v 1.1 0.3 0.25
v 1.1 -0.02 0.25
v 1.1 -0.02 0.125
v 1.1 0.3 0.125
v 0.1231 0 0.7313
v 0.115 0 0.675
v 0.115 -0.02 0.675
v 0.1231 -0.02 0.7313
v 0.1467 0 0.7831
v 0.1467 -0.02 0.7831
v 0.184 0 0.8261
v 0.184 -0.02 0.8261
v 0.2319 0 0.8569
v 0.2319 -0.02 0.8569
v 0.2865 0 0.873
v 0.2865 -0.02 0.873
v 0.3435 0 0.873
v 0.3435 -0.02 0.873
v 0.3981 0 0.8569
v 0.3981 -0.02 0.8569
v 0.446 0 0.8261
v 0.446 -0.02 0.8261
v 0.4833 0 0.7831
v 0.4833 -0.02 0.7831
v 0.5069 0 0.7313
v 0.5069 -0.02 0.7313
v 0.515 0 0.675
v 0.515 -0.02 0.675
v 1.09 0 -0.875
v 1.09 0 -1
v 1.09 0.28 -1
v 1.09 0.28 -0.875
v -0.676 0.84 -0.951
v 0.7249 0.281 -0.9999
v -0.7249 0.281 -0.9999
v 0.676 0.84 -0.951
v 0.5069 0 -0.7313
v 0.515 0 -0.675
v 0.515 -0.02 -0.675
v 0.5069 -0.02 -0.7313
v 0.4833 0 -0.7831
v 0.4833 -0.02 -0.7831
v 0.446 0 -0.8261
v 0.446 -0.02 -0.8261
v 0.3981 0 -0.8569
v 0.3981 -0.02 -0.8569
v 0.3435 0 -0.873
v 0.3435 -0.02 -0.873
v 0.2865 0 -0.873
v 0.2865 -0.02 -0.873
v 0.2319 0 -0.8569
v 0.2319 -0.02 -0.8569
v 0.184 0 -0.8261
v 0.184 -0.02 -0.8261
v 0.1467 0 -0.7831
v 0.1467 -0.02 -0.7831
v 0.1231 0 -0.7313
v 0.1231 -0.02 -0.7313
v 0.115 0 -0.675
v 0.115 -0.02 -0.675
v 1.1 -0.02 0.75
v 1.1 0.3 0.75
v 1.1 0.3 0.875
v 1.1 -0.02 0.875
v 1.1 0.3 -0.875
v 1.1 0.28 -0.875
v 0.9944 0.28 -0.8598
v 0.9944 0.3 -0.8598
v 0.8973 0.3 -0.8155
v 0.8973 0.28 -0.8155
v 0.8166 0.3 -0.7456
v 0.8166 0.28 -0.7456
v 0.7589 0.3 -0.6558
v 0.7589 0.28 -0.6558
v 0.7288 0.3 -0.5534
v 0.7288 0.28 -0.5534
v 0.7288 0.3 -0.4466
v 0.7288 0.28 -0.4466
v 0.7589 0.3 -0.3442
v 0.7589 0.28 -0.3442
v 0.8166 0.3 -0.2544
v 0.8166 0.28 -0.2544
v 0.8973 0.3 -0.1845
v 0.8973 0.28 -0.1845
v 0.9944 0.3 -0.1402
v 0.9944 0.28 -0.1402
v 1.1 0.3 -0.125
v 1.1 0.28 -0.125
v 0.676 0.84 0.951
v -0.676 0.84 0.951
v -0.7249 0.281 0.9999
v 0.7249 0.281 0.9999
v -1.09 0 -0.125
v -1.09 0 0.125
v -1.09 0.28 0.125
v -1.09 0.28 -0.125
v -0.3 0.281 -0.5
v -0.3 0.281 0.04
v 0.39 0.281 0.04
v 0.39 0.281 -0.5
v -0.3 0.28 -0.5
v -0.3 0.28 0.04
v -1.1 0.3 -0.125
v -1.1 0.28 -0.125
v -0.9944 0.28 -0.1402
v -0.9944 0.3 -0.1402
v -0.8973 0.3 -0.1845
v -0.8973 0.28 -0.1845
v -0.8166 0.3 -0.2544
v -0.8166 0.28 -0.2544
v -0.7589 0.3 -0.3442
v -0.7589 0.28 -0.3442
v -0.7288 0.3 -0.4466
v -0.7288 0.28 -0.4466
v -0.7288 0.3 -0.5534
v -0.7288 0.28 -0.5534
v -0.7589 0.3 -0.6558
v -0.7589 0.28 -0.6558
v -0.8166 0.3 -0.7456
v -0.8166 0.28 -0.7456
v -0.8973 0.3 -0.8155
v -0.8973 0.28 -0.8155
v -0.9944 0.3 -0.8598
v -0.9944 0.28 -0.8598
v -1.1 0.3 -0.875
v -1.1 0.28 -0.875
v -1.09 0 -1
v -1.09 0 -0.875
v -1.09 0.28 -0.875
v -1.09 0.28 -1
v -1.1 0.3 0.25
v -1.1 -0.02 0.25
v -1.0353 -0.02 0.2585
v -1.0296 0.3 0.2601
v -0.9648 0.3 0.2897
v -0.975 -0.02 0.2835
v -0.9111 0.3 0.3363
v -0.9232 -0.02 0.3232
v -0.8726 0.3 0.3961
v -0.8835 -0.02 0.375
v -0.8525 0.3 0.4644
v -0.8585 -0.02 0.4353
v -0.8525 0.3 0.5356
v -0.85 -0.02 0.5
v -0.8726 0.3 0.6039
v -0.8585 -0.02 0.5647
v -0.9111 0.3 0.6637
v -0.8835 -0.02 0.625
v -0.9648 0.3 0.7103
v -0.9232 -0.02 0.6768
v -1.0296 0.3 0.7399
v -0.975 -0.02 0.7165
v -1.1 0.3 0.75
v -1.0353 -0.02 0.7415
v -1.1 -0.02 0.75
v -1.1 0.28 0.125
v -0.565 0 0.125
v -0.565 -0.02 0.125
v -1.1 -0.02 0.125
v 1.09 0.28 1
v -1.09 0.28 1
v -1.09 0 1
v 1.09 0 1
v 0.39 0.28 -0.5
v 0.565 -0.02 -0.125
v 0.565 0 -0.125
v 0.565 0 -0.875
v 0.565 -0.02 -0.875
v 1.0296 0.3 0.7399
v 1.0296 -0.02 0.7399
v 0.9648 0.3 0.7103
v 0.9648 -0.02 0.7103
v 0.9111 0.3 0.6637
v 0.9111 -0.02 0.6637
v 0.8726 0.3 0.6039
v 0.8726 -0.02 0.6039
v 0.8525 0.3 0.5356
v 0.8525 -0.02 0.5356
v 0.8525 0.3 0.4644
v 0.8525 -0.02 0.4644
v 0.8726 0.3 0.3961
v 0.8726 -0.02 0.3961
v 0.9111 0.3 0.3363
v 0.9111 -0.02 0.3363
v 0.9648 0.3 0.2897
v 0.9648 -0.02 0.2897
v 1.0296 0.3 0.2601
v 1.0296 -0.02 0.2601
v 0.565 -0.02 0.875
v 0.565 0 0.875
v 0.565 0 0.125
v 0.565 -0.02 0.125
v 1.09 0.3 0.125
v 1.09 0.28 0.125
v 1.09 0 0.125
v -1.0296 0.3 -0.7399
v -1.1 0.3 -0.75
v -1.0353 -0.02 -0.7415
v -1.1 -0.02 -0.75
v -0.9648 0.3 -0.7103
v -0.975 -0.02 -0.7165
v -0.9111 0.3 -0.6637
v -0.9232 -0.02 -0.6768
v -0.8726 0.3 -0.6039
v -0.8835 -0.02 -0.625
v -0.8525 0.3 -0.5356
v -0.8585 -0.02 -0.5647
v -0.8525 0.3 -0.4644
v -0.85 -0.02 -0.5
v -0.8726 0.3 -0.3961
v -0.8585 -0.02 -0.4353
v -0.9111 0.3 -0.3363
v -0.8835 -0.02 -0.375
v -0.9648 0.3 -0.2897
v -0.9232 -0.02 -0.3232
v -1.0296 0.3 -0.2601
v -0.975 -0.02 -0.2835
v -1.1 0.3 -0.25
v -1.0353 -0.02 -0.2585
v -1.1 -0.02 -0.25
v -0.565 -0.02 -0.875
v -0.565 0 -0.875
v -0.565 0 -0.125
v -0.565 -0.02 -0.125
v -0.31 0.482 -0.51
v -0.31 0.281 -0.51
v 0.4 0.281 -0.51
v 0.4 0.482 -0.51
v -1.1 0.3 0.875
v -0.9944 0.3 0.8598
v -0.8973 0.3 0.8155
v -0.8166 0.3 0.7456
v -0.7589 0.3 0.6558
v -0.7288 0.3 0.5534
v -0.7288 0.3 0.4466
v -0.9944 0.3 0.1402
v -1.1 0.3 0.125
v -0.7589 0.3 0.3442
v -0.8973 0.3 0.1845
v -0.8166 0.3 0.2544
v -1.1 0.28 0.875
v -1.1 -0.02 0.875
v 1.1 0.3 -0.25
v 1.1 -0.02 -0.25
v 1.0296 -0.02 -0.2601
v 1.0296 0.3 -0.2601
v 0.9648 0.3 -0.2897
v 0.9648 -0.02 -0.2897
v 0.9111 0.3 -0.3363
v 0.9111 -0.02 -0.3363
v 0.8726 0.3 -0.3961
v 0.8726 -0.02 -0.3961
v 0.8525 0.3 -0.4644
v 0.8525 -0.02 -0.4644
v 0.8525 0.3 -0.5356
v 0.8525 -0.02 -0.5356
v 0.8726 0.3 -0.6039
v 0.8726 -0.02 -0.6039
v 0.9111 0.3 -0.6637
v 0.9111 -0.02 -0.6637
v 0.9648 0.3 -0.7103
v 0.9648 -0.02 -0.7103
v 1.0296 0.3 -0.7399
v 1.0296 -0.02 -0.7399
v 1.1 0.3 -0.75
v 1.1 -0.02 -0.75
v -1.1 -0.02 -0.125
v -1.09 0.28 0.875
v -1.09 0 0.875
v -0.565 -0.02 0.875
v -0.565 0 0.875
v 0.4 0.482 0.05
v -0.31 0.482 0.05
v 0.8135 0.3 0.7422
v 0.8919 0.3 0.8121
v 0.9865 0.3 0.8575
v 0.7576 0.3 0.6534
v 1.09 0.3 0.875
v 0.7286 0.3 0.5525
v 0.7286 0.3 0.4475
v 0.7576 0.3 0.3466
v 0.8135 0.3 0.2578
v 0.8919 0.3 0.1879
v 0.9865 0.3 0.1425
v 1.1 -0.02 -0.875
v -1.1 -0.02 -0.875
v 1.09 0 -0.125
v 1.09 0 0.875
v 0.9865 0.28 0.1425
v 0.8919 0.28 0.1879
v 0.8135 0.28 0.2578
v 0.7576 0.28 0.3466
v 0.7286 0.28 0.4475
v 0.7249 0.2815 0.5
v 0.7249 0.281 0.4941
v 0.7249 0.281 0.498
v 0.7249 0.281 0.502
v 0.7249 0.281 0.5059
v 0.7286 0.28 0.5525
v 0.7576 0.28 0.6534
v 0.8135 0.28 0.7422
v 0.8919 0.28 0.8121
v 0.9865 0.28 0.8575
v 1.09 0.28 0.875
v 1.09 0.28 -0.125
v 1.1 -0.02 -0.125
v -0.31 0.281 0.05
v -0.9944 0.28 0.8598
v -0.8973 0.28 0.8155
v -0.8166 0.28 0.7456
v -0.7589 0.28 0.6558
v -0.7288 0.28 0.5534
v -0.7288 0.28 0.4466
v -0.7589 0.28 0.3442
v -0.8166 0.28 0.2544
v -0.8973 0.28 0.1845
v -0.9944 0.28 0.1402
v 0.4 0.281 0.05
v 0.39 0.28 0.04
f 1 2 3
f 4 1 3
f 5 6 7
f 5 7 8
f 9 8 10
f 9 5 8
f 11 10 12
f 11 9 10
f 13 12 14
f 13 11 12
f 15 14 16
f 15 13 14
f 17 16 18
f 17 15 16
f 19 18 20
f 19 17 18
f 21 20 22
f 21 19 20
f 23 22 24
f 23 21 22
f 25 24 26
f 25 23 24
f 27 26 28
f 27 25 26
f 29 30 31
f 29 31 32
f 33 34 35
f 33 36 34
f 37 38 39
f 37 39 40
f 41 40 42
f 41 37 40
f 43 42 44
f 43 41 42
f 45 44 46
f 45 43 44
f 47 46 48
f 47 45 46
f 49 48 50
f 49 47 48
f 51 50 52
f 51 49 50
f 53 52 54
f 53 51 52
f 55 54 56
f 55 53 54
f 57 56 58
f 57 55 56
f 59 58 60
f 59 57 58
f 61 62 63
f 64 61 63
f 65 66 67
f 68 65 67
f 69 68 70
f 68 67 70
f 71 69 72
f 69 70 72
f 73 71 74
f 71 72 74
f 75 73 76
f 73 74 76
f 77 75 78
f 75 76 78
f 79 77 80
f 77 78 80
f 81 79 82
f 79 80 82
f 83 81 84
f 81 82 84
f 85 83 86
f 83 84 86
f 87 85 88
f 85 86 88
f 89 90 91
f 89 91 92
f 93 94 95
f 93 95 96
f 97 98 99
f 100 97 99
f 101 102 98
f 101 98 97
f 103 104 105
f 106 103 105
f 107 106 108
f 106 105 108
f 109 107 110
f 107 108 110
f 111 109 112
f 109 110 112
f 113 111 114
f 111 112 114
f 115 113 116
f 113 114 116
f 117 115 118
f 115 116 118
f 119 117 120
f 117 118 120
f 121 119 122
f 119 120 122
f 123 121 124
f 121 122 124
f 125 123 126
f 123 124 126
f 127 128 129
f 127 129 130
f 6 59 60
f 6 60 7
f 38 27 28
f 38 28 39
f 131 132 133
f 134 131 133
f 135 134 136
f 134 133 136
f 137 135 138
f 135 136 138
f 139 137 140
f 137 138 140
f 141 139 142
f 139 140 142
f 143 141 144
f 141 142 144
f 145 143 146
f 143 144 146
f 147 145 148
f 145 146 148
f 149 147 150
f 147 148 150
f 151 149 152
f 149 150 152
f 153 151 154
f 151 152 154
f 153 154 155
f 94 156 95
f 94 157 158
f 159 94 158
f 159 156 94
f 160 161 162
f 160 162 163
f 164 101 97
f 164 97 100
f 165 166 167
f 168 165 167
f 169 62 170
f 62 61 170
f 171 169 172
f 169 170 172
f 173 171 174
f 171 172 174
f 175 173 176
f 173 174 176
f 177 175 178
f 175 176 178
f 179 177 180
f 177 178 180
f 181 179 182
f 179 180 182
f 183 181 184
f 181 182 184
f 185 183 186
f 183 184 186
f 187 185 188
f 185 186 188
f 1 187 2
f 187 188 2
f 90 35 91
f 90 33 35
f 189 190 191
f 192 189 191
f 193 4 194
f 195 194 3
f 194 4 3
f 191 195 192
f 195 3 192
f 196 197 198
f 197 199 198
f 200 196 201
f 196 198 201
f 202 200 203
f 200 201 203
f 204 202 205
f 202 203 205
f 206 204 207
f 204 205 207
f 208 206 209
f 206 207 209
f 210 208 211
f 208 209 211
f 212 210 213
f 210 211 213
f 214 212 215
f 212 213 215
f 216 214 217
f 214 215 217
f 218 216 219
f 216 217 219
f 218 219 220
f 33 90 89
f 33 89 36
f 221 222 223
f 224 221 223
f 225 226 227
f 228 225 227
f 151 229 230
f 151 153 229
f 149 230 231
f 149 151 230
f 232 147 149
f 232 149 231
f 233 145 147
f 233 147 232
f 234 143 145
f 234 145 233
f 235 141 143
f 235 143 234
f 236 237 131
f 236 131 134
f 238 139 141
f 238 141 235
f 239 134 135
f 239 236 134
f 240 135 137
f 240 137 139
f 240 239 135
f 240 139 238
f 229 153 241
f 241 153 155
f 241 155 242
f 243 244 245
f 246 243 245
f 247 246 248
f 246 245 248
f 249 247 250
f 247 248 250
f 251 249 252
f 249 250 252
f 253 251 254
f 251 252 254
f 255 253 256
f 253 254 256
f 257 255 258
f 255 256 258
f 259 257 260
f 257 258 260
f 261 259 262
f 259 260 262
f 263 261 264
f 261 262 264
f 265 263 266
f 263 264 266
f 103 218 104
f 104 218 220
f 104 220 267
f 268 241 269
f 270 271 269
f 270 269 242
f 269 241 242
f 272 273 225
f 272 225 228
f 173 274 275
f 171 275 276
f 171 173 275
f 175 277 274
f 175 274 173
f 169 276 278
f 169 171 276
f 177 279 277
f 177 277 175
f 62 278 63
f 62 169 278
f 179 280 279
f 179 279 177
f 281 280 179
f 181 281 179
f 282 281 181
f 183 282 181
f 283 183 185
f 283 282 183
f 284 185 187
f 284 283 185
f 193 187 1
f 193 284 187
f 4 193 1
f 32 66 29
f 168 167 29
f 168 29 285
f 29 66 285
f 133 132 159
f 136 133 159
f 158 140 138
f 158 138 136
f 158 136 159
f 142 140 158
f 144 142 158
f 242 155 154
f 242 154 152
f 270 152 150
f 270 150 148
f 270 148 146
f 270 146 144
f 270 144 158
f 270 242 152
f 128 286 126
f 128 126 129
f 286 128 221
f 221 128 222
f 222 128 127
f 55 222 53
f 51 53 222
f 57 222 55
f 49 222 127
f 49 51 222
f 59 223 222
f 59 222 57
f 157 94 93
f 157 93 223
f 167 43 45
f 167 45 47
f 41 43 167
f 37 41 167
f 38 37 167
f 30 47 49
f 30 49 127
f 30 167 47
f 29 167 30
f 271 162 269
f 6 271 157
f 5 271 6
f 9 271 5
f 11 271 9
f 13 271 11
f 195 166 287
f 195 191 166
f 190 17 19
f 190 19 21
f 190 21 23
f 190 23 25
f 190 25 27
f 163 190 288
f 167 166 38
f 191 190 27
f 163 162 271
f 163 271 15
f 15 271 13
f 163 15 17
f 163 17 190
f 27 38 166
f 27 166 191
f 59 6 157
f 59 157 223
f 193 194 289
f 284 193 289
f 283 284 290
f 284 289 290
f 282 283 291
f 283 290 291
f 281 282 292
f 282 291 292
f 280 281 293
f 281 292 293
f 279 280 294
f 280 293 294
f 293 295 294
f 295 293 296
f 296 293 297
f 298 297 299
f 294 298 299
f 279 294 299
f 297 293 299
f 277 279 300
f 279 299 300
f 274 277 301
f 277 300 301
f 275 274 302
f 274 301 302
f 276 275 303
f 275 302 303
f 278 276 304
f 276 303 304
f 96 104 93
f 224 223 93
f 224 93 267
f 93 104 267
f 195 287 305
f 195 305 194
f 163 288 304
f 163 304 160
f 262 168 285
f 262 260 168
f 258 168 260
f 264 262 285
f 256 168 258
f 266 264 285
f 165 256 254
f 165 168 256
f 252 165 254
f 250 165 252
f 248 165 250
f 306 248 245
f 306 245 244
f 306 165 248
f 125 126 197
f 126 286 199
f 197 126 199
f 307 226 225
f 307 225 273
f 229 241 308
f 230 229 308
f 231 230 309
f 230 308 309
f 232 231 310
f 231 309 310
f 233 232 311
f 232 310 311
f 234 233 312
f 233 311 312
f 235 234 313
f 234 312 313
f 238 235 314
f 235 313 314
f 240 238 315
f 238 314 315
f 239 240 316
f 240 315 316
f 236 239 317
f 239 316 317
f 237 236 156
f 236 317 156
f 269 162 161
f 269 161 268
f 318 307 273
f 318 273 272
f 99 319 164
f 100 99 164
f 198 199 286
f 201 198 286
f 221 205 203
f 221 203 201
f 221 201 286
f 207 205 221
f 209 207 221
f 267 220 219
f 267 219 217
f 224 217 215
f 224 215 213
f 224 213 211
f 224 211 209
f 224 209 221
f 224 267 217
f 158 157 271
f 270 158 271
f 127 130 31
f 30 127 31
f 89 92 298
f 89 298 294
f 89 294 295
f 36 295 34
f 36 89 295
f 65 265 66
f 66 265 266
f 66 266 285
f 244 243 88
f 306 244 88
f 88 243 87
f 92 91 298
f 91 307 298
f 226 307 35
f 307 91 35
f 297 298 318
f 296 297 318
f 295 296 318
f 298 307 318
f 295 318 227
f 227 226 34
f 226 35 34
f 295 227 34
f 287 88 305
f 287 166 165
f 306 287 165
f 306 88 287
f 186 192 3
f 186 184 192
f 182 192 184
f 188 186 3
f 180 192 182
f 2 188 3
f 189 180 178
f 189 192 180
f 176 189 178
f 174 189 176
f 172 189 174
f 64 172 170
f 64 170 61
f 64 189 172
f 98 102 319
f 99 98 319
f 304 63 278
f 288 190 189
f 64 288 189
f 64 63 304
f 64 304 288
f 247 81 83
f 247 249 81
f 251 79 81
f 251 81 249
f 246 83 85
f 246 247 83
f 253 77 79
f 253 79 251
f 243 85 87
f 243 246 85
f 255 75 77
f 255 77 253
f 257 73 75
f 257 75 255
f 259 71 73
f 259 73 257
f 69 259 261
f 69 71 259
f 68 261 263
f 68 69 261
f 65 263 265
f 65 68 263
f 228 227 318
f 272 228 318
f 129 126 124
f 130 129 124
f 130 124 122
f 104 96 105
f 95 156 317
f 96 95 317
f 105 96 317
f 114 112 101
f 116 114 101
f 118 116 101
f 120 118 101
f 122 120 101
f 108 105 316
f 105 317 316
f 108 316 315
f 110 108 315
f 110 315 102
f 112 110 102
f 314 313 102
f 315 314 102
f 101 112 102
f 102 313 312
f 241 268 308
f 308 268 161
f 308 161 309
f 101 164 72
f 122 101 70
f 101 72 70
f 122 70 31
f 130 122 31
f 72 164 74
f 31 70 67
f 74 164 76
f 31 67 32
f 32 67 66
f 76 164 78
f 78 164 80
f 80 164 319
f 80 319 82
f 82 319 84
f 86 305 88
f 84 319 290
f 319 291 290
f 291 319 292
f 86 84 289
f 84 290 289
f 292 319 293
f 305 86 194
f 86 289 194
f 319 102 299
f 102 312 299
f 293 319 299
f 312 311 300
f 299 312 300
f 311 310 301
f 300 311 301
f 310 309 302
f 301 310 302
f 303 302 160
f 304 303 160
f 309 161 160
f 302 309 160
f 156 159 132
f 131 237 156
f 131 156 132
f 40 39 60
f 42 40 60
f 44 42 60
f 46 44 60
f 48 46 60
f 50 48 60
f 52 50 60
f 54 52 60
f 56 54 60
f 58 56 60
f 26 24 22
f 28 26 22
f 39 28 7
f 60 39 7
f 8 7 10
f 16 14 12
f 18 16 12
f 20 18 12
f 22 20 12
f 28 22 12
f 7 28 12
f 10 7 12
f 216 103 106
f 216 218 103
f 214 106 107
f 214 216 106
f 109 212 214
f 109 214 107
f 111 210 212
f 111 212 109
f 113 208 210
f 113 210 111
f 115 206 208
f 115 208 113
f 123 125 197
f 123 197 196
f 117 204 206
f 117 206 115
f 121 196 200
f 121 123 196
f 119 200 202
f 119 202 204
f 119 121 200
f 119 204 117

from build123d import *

# Parameters (mm, degrees)
SKETCH1_W             = 2.2
SKETCH1_H             = 2
BOSS_EXTRUDE1_DEPTH   = 0.28
BOSS_EXTRUDE2_DEPTH   = 0.02
CUT_EXTRUDE1_DEPTH    = 2
SKETCH4_W             = 0.125
SKETCH4_H             = 0.28
SKETCH4_W_2           = 0.25
CUT_EXTRUDE2_DEPTH    = 0.01
SKETCH5_W             = 0.125
SKETCH5_H             = 0.28
SKETCH5_W_2           = 0.25
CUT_EXTRUDE3_DEPTH    = 0.01
SKETCH6_W             = 1.45
SKETCH6_H             = 2
BOSS_EXTRUDE3_DEPTH   = 0.56
BOSS_EXTRUDE3_TAPER   = 5
SKETCH8_W             = 1.45
SKETCH8_H             = 2
CUT_EXTRUDE4_DEPTH    = 0.001
SKETCH10_W            = 0.69
SKETCH10_H            = 0.54
BOSS_EXTRUDE5_DEPTH   = 0.2
SKETCH11_W            = 0.71
SKETCH11_H            = 0.56
SKETCH11_W_2          = 0.69
SKETCH11_H_2          = 0.54
CUT_EXTRUDE5_DEPTH    = 0.201
BOSS_EXTRUDE4_DEPTH   = 0.02
BOSS_EXTRUDE6_DEPTH   = 0.02
BODY_MOVE_COPY1_ANGLE = 90
BODY_MOVE_COPY3_ANGLE = 90


with BuildPart() as part:
    # Sketch1 → Boss-Extrude1 (new body)
    with BuildSketch(Plane(origin=(0, 0, 0), x_dir=(1, 0, 0), z_dir=(0, 1, 0))):
        Rectangle(SKETCH1_W, SKETCH1_H)
    extrude(amount=BOSS_EXTRUDE1_DEPTH)

    # Sketch2 → Boss-Extrude2 (add)
    with BuildSketch(Plane(origin=(0, 0.28, 0), x_dir=(1, 0, 0), z_dir=(0, 1, 0))):
        with BuildLine():
            Line((-0.565, 0.875), (-1.1, 0.875))
            Line((-1.1, 0.875), (-1.1, 0.75))
            ThreePointArc((-1.1, 0.75), (-0.923223305, 0.676776695), (-0.85, 0.5))
            ThreePointArc((-0.85, 0.5), (-0.923223305, 0.323223305), (-1.1, 0.25))
            Line((-1.1, 0.25), (-1.1, 0.125))
            Line((-1.1, 0.125), (-0.565, 0.125))
            Line((-0.565, 0.125), (-0.565, 0.875))
        make_face()
        with BuildLine():
            Line((1.1, 0.875), (0.565, 0.875))
            Line((0.565, 0.875), (0.565, 0.125))
            Line((0.565, 0.125), (1.1, 0.125))
            Line((1.1, 0.125), (1.1, 0.25))
            ThreePointArc((1.1, 0.25), (0.85, 0.5), (1.1, 0.75))
            Line((1.1, 0.75), (1.1, 0.875))
        make_face()
        with BuildLine():
            Line((1.1, -0.25), (1.1, -0.125))
            Line((1.1, -0.125), (0.565, -0.125))
            Line((0.565, -0.125), (0.565, -0.875))
            Line((0.565, -0.875), (1.1, -0.875))
            Line((1.1, -0.875), (1.1, -0.75))
            ThreePointArc((1.1, -0.75), (0.85, -0.5), (1.1, -0.25))
        make_face()
        with BuildLine():
            Line((-0.565, -0.125), (-1.1, -0.125))
            Line((-1.1, -0.125), (-1.1, -0.25))
            ThreePointArc((-1.1, -0.25), (-0.923223305, -0.323223305), (-0.85, -0.5))
            ThreePointArc((-0.85, -0.5), (-0.923223305, -0.676776695), (-1.1, -0.75))
            Line((-1.1, -0.75), (-1.1, -0.875))
            Line((-1.1, -0.875), (-0.565, -0.875))
            Line((-0.565, -0.875), (-0.565, -0.125))
        make_face()
    extrude(amount=BOSS_EXTRUDE2_DEPTH)

    # Sketch3 → Cut-Extrude1 (cut)
    with BuildSketch(Plane(origin=(0, 0.28, 0), x_dir=(1, 0, 0), z_dir=(0, 1, 0))):
        with BuildLine():
            Line((-1.1, 0.75), (-1.1, 0.25))
            ThreePointArc((-1.1, 0.25), (-0.85, 0.5), (-1.1, 0.75))
        make_face()
        with BuildLine():
            Line((-1.1, -0.25), (-1.1, -0.75))
            ThreePointArc((-1.1, -0.75), (-0.85, -0.5), (-1.1, -0.25))
        make_face()
        with BuildLine():
            Line((1.1, 0.25), (1.1, 0.75))
            ThreePointArc((1.1, 0.75), (0.85, 0.5), (1.1, 0.25))
        make_face()
        with BuildLine():
            Line((1.1, -0.75), (1.1, -0.25))
            ThreePointArc((1.1, -0.25), (0.85, -0.5), (1.1, -0.75))
        make_face()
    extrude(amount=-CUT_EXTRUDE1_DEPTH, mode=Mode.SUBTRACT)

    # Sketch4 → Cut-Extrude2 (cut)
    with BuildSketch(Plane.ZY.offset(1.1)):
        with Locations((-0.9375, 0.14)):
            Rectangle(SKETCH4_W, SKETCH4_H)
        with Locations((0, 0.14)):
            Rectangle(SKETCH4_W_2, SKETCH4_H)
        with Locations((0.9375, 0.14)):
            Rectangle(SKETCH4_W, SKETCH4_H)
    extrude(amount=-CUT_EXTRUDE2_DEPTH, mode=Mode.SUBTRACT)

    # Sketch5 → Cut-Extrude3 (cut)
    with BuildSketch(Plane(origin=(1.1, 0, 0), x_dir=(0, 0, -1), z_dir=(1, 0, 0))):
        with Locations((-0.9375, 0.14)):
            Rectangle(SKETCH5_W, SKETCH5_H)
        with Locations((0, 0.14)):
            Rectangle(SKETCH5_W_2, SKETCH5_H)
        with Locations((0.9375, 0.14)):
            Rectangle(SKETCH5_W, SKETCH5_H)
    extrude(amount=-CUT_EXTRUDE3_DEPTH, mode=Mode.SUBTRACT)

    # Sketch6 → Boss-Extrude3 (add)
    with BuildSketch(Plane.XZ):
        Rectangle(SKETCH6_W, SKETCH6_H)
    extrude(amount=BOSS_EXTRUDE3_DEPTH, taper=BOSS_EXTRUDE3_TAPER)

    # Sketch8 → Cut-Extrude4 (cut)
    with BuildSketch(Plane.XZ):
        Rectangle(SKETCH8_W, SKETCH8_H)
    extrude(amount=CUT_EXTRUDE4_DEPTH, mode=Mode.SUBTRACT)


with BuildPart() as cut_extrude4_piece_1:
    # of the separate pieces the step leaves, piece 1, a body of its own (cut_extrude4_pieces)
    add(part.part.solids().sort_by_distance((-0.724912511, -0.001, -0.999912511))[0])



with BuildPart() as cut_extrude4_piece_2:
    # of the separate pieces the step leaves, piece 2, a body of its own (cut_extrude4_pieces)
    add(part.part.solids().sort_by_distance((1.09, 0, -1))[0])


with BuildPart() as cut_extrude4_piece_1_1:
    add(cut_extrude4_piece_1.part)

    add(cut_extrude4_piece_2.part)  # Boss-Extrude5 merges Cut-Extrude4 piece 2
    # Sketch10 → Boss-Extrude5 (add)
    with BuildSketch(Plane.XZ):
        with Locations((0.045, 0.23)):
            Rectangle(SKETCH10_W, SKETCH10_H)
    extrude(amount=BOSS_EXTRUDE5_DEPTH)

    # Sketch11 → Cut-Extrude5 (cut)
    with BuildSketch(Plane(origin=(0, -0.001, 0), x_dir=(1, 0, 0), z_dir=(0, 1, 0))):
        with Locations((0.045, -0.23)):
            Rectangle(SKETCH11_W, SKETCH11_H)
        with Locations((0.045, -0.23)):
            Rectangle(SKETCH11_W_2, SKETCH11_H_2, mode=Mode.SUBTRACT)
        with Locations((0.045, -0.23)):
            Rectangle(SKETCH11_W_2, SKETCH11_H_2)
    extrude(amount=-CUT_EXTRUDE5_DEPTH, mode=Mode.SUBTRACT)


with BuildPart() as cut_extrude5_piece_1:
    # of the separate pieces the step leaves, piece 1, a body of its own (cut_extrude5_pieces)
    add(cut_extrude4_piece_1_1.part.solids().sort_by_distance((0.724912511, -0.001, 0.999912511))[0])



with BuildPart() as cut_extrude5_piece_2:
    # of the separate pieces the step leaves, piece 2, a body of its own (cut_extrude5_pieces)
    add(cut_extrude4_piece_1_1.part.solids().sort_by_distance((1.09, 0, -1))[0])


with BuildPart() as cut_extrude5_piece_1_1:
    add(cut_extrude5_piece_1.part)

    add(cut_extrude5_piece_2.part)  # Boss-Extrude4 merges Cut-Extrude5 piece 2
    # Sketch9 → Boss-Extrude4 (add)
    with BuildSketch(Plane.XZ):
        with BuildLine():
            ThreePointArc((-1.1, 0.125), (-0.725, 0.5), (-1.1, 0.875))
            Line((-1.1, 0.875), (-1.1, 0.75))
            ThreePointArc((-1.1, 0.75), (-0.85, 0.5), (-1.1, 0.25))
            Line((-1.1, 0.25), (-1.1, 0.125))
        make_face()
        with BuildLine():
            ThreePointArc((-1.1, -0.875), (-0.725, -0.5), (-1.1, -0.125))
            Line((-1.1, -0.125), (-1.1, -0.25))
            ThreePointArc((-1.1, -0.25), (-0.85, -0.5), (-1.1, -0.75))
            Line((-1.1, -0.75), (-1.1, -0.875))
        make_face()
        with BuildLine():
            ThreePointArc((1.1, 0.875), (0.725, 0.5), (1.1, 0.125))
            Line((1.1, 0.125), (1.1, 0.25))
            ThreePointArc((1.1, 0.25), (0.85, 0.5), (1.1, 0.75))
            Line((1.1, 0.75), (1.1, 0.875))
        make_face()
        with BuildLine():
            ThreePointArc((1.09, -0.125), (0.72486669, -0.5), (1.09, -0.875))
            Line((1.09, -0.875), (1.1, -0.875))
            Line((1.1, -0.875), (1.1, -0.75))
            ThreePointArc((1.1, -0.75), (0.85, -0.5), (1.1, -0.25))
            Line((1.1, -0.25), (1.1, -0.125))
            Line((1.1, -0.125), (1.09, -0.125))
        make_face()
    extrude(amount=BOSS_EXTRUDE4_DEPTH)

    # Sketch12 → Boss-Extrude6 (add)
    with BuildSketch(Plane(origin=(0, 0.28, 0), x_dir=(1, 0, 0), z_dir=(0, 1, 0))):
        with BuildLine():
            Line((0.515, 0.675), (0.515, -0.675))
            ThreePointArc((0.515, -0.675), (0.315, -0.875), (0.115, -0.675))
            Line((0.115, -0.675), (0.115, 0.675))
            ThreePointArc((0.115, 0.675), (0.315, 0.875), (0.515, 0.675))
        make_face()
    extrude(amount=BOSS_EXTRUDE6_DEPTH)


with BuildPart() as cut_extrude5_piece_1_2:
    # Body-Move/Copy1: moved
    add(cut_extrude5_piece_1_1.part.rotate(Axis((0, 0, 0), (-1, 0, 0)), BODY_MOVE_COPY1_ANGLE))


with BuildPart() as cut_extrude5_piece_1_3:
    # Body-Move/Copy2: moved
    add(cut_extrude5_piece_1_2.part.moved(Location((0, 0, 0.28))))


with BuildPart() as cut_extrude5_piece_1_4:
    # Body-Move/Copy3: moved
    add(cut_extrude5_piece_1_3.part.rotate(Axis((0, 0, 0), (-1, 0, 0)), BODY_MOVE_COPY3_ANGLE))


solid = cut_extrude5_piece_1_4.part
